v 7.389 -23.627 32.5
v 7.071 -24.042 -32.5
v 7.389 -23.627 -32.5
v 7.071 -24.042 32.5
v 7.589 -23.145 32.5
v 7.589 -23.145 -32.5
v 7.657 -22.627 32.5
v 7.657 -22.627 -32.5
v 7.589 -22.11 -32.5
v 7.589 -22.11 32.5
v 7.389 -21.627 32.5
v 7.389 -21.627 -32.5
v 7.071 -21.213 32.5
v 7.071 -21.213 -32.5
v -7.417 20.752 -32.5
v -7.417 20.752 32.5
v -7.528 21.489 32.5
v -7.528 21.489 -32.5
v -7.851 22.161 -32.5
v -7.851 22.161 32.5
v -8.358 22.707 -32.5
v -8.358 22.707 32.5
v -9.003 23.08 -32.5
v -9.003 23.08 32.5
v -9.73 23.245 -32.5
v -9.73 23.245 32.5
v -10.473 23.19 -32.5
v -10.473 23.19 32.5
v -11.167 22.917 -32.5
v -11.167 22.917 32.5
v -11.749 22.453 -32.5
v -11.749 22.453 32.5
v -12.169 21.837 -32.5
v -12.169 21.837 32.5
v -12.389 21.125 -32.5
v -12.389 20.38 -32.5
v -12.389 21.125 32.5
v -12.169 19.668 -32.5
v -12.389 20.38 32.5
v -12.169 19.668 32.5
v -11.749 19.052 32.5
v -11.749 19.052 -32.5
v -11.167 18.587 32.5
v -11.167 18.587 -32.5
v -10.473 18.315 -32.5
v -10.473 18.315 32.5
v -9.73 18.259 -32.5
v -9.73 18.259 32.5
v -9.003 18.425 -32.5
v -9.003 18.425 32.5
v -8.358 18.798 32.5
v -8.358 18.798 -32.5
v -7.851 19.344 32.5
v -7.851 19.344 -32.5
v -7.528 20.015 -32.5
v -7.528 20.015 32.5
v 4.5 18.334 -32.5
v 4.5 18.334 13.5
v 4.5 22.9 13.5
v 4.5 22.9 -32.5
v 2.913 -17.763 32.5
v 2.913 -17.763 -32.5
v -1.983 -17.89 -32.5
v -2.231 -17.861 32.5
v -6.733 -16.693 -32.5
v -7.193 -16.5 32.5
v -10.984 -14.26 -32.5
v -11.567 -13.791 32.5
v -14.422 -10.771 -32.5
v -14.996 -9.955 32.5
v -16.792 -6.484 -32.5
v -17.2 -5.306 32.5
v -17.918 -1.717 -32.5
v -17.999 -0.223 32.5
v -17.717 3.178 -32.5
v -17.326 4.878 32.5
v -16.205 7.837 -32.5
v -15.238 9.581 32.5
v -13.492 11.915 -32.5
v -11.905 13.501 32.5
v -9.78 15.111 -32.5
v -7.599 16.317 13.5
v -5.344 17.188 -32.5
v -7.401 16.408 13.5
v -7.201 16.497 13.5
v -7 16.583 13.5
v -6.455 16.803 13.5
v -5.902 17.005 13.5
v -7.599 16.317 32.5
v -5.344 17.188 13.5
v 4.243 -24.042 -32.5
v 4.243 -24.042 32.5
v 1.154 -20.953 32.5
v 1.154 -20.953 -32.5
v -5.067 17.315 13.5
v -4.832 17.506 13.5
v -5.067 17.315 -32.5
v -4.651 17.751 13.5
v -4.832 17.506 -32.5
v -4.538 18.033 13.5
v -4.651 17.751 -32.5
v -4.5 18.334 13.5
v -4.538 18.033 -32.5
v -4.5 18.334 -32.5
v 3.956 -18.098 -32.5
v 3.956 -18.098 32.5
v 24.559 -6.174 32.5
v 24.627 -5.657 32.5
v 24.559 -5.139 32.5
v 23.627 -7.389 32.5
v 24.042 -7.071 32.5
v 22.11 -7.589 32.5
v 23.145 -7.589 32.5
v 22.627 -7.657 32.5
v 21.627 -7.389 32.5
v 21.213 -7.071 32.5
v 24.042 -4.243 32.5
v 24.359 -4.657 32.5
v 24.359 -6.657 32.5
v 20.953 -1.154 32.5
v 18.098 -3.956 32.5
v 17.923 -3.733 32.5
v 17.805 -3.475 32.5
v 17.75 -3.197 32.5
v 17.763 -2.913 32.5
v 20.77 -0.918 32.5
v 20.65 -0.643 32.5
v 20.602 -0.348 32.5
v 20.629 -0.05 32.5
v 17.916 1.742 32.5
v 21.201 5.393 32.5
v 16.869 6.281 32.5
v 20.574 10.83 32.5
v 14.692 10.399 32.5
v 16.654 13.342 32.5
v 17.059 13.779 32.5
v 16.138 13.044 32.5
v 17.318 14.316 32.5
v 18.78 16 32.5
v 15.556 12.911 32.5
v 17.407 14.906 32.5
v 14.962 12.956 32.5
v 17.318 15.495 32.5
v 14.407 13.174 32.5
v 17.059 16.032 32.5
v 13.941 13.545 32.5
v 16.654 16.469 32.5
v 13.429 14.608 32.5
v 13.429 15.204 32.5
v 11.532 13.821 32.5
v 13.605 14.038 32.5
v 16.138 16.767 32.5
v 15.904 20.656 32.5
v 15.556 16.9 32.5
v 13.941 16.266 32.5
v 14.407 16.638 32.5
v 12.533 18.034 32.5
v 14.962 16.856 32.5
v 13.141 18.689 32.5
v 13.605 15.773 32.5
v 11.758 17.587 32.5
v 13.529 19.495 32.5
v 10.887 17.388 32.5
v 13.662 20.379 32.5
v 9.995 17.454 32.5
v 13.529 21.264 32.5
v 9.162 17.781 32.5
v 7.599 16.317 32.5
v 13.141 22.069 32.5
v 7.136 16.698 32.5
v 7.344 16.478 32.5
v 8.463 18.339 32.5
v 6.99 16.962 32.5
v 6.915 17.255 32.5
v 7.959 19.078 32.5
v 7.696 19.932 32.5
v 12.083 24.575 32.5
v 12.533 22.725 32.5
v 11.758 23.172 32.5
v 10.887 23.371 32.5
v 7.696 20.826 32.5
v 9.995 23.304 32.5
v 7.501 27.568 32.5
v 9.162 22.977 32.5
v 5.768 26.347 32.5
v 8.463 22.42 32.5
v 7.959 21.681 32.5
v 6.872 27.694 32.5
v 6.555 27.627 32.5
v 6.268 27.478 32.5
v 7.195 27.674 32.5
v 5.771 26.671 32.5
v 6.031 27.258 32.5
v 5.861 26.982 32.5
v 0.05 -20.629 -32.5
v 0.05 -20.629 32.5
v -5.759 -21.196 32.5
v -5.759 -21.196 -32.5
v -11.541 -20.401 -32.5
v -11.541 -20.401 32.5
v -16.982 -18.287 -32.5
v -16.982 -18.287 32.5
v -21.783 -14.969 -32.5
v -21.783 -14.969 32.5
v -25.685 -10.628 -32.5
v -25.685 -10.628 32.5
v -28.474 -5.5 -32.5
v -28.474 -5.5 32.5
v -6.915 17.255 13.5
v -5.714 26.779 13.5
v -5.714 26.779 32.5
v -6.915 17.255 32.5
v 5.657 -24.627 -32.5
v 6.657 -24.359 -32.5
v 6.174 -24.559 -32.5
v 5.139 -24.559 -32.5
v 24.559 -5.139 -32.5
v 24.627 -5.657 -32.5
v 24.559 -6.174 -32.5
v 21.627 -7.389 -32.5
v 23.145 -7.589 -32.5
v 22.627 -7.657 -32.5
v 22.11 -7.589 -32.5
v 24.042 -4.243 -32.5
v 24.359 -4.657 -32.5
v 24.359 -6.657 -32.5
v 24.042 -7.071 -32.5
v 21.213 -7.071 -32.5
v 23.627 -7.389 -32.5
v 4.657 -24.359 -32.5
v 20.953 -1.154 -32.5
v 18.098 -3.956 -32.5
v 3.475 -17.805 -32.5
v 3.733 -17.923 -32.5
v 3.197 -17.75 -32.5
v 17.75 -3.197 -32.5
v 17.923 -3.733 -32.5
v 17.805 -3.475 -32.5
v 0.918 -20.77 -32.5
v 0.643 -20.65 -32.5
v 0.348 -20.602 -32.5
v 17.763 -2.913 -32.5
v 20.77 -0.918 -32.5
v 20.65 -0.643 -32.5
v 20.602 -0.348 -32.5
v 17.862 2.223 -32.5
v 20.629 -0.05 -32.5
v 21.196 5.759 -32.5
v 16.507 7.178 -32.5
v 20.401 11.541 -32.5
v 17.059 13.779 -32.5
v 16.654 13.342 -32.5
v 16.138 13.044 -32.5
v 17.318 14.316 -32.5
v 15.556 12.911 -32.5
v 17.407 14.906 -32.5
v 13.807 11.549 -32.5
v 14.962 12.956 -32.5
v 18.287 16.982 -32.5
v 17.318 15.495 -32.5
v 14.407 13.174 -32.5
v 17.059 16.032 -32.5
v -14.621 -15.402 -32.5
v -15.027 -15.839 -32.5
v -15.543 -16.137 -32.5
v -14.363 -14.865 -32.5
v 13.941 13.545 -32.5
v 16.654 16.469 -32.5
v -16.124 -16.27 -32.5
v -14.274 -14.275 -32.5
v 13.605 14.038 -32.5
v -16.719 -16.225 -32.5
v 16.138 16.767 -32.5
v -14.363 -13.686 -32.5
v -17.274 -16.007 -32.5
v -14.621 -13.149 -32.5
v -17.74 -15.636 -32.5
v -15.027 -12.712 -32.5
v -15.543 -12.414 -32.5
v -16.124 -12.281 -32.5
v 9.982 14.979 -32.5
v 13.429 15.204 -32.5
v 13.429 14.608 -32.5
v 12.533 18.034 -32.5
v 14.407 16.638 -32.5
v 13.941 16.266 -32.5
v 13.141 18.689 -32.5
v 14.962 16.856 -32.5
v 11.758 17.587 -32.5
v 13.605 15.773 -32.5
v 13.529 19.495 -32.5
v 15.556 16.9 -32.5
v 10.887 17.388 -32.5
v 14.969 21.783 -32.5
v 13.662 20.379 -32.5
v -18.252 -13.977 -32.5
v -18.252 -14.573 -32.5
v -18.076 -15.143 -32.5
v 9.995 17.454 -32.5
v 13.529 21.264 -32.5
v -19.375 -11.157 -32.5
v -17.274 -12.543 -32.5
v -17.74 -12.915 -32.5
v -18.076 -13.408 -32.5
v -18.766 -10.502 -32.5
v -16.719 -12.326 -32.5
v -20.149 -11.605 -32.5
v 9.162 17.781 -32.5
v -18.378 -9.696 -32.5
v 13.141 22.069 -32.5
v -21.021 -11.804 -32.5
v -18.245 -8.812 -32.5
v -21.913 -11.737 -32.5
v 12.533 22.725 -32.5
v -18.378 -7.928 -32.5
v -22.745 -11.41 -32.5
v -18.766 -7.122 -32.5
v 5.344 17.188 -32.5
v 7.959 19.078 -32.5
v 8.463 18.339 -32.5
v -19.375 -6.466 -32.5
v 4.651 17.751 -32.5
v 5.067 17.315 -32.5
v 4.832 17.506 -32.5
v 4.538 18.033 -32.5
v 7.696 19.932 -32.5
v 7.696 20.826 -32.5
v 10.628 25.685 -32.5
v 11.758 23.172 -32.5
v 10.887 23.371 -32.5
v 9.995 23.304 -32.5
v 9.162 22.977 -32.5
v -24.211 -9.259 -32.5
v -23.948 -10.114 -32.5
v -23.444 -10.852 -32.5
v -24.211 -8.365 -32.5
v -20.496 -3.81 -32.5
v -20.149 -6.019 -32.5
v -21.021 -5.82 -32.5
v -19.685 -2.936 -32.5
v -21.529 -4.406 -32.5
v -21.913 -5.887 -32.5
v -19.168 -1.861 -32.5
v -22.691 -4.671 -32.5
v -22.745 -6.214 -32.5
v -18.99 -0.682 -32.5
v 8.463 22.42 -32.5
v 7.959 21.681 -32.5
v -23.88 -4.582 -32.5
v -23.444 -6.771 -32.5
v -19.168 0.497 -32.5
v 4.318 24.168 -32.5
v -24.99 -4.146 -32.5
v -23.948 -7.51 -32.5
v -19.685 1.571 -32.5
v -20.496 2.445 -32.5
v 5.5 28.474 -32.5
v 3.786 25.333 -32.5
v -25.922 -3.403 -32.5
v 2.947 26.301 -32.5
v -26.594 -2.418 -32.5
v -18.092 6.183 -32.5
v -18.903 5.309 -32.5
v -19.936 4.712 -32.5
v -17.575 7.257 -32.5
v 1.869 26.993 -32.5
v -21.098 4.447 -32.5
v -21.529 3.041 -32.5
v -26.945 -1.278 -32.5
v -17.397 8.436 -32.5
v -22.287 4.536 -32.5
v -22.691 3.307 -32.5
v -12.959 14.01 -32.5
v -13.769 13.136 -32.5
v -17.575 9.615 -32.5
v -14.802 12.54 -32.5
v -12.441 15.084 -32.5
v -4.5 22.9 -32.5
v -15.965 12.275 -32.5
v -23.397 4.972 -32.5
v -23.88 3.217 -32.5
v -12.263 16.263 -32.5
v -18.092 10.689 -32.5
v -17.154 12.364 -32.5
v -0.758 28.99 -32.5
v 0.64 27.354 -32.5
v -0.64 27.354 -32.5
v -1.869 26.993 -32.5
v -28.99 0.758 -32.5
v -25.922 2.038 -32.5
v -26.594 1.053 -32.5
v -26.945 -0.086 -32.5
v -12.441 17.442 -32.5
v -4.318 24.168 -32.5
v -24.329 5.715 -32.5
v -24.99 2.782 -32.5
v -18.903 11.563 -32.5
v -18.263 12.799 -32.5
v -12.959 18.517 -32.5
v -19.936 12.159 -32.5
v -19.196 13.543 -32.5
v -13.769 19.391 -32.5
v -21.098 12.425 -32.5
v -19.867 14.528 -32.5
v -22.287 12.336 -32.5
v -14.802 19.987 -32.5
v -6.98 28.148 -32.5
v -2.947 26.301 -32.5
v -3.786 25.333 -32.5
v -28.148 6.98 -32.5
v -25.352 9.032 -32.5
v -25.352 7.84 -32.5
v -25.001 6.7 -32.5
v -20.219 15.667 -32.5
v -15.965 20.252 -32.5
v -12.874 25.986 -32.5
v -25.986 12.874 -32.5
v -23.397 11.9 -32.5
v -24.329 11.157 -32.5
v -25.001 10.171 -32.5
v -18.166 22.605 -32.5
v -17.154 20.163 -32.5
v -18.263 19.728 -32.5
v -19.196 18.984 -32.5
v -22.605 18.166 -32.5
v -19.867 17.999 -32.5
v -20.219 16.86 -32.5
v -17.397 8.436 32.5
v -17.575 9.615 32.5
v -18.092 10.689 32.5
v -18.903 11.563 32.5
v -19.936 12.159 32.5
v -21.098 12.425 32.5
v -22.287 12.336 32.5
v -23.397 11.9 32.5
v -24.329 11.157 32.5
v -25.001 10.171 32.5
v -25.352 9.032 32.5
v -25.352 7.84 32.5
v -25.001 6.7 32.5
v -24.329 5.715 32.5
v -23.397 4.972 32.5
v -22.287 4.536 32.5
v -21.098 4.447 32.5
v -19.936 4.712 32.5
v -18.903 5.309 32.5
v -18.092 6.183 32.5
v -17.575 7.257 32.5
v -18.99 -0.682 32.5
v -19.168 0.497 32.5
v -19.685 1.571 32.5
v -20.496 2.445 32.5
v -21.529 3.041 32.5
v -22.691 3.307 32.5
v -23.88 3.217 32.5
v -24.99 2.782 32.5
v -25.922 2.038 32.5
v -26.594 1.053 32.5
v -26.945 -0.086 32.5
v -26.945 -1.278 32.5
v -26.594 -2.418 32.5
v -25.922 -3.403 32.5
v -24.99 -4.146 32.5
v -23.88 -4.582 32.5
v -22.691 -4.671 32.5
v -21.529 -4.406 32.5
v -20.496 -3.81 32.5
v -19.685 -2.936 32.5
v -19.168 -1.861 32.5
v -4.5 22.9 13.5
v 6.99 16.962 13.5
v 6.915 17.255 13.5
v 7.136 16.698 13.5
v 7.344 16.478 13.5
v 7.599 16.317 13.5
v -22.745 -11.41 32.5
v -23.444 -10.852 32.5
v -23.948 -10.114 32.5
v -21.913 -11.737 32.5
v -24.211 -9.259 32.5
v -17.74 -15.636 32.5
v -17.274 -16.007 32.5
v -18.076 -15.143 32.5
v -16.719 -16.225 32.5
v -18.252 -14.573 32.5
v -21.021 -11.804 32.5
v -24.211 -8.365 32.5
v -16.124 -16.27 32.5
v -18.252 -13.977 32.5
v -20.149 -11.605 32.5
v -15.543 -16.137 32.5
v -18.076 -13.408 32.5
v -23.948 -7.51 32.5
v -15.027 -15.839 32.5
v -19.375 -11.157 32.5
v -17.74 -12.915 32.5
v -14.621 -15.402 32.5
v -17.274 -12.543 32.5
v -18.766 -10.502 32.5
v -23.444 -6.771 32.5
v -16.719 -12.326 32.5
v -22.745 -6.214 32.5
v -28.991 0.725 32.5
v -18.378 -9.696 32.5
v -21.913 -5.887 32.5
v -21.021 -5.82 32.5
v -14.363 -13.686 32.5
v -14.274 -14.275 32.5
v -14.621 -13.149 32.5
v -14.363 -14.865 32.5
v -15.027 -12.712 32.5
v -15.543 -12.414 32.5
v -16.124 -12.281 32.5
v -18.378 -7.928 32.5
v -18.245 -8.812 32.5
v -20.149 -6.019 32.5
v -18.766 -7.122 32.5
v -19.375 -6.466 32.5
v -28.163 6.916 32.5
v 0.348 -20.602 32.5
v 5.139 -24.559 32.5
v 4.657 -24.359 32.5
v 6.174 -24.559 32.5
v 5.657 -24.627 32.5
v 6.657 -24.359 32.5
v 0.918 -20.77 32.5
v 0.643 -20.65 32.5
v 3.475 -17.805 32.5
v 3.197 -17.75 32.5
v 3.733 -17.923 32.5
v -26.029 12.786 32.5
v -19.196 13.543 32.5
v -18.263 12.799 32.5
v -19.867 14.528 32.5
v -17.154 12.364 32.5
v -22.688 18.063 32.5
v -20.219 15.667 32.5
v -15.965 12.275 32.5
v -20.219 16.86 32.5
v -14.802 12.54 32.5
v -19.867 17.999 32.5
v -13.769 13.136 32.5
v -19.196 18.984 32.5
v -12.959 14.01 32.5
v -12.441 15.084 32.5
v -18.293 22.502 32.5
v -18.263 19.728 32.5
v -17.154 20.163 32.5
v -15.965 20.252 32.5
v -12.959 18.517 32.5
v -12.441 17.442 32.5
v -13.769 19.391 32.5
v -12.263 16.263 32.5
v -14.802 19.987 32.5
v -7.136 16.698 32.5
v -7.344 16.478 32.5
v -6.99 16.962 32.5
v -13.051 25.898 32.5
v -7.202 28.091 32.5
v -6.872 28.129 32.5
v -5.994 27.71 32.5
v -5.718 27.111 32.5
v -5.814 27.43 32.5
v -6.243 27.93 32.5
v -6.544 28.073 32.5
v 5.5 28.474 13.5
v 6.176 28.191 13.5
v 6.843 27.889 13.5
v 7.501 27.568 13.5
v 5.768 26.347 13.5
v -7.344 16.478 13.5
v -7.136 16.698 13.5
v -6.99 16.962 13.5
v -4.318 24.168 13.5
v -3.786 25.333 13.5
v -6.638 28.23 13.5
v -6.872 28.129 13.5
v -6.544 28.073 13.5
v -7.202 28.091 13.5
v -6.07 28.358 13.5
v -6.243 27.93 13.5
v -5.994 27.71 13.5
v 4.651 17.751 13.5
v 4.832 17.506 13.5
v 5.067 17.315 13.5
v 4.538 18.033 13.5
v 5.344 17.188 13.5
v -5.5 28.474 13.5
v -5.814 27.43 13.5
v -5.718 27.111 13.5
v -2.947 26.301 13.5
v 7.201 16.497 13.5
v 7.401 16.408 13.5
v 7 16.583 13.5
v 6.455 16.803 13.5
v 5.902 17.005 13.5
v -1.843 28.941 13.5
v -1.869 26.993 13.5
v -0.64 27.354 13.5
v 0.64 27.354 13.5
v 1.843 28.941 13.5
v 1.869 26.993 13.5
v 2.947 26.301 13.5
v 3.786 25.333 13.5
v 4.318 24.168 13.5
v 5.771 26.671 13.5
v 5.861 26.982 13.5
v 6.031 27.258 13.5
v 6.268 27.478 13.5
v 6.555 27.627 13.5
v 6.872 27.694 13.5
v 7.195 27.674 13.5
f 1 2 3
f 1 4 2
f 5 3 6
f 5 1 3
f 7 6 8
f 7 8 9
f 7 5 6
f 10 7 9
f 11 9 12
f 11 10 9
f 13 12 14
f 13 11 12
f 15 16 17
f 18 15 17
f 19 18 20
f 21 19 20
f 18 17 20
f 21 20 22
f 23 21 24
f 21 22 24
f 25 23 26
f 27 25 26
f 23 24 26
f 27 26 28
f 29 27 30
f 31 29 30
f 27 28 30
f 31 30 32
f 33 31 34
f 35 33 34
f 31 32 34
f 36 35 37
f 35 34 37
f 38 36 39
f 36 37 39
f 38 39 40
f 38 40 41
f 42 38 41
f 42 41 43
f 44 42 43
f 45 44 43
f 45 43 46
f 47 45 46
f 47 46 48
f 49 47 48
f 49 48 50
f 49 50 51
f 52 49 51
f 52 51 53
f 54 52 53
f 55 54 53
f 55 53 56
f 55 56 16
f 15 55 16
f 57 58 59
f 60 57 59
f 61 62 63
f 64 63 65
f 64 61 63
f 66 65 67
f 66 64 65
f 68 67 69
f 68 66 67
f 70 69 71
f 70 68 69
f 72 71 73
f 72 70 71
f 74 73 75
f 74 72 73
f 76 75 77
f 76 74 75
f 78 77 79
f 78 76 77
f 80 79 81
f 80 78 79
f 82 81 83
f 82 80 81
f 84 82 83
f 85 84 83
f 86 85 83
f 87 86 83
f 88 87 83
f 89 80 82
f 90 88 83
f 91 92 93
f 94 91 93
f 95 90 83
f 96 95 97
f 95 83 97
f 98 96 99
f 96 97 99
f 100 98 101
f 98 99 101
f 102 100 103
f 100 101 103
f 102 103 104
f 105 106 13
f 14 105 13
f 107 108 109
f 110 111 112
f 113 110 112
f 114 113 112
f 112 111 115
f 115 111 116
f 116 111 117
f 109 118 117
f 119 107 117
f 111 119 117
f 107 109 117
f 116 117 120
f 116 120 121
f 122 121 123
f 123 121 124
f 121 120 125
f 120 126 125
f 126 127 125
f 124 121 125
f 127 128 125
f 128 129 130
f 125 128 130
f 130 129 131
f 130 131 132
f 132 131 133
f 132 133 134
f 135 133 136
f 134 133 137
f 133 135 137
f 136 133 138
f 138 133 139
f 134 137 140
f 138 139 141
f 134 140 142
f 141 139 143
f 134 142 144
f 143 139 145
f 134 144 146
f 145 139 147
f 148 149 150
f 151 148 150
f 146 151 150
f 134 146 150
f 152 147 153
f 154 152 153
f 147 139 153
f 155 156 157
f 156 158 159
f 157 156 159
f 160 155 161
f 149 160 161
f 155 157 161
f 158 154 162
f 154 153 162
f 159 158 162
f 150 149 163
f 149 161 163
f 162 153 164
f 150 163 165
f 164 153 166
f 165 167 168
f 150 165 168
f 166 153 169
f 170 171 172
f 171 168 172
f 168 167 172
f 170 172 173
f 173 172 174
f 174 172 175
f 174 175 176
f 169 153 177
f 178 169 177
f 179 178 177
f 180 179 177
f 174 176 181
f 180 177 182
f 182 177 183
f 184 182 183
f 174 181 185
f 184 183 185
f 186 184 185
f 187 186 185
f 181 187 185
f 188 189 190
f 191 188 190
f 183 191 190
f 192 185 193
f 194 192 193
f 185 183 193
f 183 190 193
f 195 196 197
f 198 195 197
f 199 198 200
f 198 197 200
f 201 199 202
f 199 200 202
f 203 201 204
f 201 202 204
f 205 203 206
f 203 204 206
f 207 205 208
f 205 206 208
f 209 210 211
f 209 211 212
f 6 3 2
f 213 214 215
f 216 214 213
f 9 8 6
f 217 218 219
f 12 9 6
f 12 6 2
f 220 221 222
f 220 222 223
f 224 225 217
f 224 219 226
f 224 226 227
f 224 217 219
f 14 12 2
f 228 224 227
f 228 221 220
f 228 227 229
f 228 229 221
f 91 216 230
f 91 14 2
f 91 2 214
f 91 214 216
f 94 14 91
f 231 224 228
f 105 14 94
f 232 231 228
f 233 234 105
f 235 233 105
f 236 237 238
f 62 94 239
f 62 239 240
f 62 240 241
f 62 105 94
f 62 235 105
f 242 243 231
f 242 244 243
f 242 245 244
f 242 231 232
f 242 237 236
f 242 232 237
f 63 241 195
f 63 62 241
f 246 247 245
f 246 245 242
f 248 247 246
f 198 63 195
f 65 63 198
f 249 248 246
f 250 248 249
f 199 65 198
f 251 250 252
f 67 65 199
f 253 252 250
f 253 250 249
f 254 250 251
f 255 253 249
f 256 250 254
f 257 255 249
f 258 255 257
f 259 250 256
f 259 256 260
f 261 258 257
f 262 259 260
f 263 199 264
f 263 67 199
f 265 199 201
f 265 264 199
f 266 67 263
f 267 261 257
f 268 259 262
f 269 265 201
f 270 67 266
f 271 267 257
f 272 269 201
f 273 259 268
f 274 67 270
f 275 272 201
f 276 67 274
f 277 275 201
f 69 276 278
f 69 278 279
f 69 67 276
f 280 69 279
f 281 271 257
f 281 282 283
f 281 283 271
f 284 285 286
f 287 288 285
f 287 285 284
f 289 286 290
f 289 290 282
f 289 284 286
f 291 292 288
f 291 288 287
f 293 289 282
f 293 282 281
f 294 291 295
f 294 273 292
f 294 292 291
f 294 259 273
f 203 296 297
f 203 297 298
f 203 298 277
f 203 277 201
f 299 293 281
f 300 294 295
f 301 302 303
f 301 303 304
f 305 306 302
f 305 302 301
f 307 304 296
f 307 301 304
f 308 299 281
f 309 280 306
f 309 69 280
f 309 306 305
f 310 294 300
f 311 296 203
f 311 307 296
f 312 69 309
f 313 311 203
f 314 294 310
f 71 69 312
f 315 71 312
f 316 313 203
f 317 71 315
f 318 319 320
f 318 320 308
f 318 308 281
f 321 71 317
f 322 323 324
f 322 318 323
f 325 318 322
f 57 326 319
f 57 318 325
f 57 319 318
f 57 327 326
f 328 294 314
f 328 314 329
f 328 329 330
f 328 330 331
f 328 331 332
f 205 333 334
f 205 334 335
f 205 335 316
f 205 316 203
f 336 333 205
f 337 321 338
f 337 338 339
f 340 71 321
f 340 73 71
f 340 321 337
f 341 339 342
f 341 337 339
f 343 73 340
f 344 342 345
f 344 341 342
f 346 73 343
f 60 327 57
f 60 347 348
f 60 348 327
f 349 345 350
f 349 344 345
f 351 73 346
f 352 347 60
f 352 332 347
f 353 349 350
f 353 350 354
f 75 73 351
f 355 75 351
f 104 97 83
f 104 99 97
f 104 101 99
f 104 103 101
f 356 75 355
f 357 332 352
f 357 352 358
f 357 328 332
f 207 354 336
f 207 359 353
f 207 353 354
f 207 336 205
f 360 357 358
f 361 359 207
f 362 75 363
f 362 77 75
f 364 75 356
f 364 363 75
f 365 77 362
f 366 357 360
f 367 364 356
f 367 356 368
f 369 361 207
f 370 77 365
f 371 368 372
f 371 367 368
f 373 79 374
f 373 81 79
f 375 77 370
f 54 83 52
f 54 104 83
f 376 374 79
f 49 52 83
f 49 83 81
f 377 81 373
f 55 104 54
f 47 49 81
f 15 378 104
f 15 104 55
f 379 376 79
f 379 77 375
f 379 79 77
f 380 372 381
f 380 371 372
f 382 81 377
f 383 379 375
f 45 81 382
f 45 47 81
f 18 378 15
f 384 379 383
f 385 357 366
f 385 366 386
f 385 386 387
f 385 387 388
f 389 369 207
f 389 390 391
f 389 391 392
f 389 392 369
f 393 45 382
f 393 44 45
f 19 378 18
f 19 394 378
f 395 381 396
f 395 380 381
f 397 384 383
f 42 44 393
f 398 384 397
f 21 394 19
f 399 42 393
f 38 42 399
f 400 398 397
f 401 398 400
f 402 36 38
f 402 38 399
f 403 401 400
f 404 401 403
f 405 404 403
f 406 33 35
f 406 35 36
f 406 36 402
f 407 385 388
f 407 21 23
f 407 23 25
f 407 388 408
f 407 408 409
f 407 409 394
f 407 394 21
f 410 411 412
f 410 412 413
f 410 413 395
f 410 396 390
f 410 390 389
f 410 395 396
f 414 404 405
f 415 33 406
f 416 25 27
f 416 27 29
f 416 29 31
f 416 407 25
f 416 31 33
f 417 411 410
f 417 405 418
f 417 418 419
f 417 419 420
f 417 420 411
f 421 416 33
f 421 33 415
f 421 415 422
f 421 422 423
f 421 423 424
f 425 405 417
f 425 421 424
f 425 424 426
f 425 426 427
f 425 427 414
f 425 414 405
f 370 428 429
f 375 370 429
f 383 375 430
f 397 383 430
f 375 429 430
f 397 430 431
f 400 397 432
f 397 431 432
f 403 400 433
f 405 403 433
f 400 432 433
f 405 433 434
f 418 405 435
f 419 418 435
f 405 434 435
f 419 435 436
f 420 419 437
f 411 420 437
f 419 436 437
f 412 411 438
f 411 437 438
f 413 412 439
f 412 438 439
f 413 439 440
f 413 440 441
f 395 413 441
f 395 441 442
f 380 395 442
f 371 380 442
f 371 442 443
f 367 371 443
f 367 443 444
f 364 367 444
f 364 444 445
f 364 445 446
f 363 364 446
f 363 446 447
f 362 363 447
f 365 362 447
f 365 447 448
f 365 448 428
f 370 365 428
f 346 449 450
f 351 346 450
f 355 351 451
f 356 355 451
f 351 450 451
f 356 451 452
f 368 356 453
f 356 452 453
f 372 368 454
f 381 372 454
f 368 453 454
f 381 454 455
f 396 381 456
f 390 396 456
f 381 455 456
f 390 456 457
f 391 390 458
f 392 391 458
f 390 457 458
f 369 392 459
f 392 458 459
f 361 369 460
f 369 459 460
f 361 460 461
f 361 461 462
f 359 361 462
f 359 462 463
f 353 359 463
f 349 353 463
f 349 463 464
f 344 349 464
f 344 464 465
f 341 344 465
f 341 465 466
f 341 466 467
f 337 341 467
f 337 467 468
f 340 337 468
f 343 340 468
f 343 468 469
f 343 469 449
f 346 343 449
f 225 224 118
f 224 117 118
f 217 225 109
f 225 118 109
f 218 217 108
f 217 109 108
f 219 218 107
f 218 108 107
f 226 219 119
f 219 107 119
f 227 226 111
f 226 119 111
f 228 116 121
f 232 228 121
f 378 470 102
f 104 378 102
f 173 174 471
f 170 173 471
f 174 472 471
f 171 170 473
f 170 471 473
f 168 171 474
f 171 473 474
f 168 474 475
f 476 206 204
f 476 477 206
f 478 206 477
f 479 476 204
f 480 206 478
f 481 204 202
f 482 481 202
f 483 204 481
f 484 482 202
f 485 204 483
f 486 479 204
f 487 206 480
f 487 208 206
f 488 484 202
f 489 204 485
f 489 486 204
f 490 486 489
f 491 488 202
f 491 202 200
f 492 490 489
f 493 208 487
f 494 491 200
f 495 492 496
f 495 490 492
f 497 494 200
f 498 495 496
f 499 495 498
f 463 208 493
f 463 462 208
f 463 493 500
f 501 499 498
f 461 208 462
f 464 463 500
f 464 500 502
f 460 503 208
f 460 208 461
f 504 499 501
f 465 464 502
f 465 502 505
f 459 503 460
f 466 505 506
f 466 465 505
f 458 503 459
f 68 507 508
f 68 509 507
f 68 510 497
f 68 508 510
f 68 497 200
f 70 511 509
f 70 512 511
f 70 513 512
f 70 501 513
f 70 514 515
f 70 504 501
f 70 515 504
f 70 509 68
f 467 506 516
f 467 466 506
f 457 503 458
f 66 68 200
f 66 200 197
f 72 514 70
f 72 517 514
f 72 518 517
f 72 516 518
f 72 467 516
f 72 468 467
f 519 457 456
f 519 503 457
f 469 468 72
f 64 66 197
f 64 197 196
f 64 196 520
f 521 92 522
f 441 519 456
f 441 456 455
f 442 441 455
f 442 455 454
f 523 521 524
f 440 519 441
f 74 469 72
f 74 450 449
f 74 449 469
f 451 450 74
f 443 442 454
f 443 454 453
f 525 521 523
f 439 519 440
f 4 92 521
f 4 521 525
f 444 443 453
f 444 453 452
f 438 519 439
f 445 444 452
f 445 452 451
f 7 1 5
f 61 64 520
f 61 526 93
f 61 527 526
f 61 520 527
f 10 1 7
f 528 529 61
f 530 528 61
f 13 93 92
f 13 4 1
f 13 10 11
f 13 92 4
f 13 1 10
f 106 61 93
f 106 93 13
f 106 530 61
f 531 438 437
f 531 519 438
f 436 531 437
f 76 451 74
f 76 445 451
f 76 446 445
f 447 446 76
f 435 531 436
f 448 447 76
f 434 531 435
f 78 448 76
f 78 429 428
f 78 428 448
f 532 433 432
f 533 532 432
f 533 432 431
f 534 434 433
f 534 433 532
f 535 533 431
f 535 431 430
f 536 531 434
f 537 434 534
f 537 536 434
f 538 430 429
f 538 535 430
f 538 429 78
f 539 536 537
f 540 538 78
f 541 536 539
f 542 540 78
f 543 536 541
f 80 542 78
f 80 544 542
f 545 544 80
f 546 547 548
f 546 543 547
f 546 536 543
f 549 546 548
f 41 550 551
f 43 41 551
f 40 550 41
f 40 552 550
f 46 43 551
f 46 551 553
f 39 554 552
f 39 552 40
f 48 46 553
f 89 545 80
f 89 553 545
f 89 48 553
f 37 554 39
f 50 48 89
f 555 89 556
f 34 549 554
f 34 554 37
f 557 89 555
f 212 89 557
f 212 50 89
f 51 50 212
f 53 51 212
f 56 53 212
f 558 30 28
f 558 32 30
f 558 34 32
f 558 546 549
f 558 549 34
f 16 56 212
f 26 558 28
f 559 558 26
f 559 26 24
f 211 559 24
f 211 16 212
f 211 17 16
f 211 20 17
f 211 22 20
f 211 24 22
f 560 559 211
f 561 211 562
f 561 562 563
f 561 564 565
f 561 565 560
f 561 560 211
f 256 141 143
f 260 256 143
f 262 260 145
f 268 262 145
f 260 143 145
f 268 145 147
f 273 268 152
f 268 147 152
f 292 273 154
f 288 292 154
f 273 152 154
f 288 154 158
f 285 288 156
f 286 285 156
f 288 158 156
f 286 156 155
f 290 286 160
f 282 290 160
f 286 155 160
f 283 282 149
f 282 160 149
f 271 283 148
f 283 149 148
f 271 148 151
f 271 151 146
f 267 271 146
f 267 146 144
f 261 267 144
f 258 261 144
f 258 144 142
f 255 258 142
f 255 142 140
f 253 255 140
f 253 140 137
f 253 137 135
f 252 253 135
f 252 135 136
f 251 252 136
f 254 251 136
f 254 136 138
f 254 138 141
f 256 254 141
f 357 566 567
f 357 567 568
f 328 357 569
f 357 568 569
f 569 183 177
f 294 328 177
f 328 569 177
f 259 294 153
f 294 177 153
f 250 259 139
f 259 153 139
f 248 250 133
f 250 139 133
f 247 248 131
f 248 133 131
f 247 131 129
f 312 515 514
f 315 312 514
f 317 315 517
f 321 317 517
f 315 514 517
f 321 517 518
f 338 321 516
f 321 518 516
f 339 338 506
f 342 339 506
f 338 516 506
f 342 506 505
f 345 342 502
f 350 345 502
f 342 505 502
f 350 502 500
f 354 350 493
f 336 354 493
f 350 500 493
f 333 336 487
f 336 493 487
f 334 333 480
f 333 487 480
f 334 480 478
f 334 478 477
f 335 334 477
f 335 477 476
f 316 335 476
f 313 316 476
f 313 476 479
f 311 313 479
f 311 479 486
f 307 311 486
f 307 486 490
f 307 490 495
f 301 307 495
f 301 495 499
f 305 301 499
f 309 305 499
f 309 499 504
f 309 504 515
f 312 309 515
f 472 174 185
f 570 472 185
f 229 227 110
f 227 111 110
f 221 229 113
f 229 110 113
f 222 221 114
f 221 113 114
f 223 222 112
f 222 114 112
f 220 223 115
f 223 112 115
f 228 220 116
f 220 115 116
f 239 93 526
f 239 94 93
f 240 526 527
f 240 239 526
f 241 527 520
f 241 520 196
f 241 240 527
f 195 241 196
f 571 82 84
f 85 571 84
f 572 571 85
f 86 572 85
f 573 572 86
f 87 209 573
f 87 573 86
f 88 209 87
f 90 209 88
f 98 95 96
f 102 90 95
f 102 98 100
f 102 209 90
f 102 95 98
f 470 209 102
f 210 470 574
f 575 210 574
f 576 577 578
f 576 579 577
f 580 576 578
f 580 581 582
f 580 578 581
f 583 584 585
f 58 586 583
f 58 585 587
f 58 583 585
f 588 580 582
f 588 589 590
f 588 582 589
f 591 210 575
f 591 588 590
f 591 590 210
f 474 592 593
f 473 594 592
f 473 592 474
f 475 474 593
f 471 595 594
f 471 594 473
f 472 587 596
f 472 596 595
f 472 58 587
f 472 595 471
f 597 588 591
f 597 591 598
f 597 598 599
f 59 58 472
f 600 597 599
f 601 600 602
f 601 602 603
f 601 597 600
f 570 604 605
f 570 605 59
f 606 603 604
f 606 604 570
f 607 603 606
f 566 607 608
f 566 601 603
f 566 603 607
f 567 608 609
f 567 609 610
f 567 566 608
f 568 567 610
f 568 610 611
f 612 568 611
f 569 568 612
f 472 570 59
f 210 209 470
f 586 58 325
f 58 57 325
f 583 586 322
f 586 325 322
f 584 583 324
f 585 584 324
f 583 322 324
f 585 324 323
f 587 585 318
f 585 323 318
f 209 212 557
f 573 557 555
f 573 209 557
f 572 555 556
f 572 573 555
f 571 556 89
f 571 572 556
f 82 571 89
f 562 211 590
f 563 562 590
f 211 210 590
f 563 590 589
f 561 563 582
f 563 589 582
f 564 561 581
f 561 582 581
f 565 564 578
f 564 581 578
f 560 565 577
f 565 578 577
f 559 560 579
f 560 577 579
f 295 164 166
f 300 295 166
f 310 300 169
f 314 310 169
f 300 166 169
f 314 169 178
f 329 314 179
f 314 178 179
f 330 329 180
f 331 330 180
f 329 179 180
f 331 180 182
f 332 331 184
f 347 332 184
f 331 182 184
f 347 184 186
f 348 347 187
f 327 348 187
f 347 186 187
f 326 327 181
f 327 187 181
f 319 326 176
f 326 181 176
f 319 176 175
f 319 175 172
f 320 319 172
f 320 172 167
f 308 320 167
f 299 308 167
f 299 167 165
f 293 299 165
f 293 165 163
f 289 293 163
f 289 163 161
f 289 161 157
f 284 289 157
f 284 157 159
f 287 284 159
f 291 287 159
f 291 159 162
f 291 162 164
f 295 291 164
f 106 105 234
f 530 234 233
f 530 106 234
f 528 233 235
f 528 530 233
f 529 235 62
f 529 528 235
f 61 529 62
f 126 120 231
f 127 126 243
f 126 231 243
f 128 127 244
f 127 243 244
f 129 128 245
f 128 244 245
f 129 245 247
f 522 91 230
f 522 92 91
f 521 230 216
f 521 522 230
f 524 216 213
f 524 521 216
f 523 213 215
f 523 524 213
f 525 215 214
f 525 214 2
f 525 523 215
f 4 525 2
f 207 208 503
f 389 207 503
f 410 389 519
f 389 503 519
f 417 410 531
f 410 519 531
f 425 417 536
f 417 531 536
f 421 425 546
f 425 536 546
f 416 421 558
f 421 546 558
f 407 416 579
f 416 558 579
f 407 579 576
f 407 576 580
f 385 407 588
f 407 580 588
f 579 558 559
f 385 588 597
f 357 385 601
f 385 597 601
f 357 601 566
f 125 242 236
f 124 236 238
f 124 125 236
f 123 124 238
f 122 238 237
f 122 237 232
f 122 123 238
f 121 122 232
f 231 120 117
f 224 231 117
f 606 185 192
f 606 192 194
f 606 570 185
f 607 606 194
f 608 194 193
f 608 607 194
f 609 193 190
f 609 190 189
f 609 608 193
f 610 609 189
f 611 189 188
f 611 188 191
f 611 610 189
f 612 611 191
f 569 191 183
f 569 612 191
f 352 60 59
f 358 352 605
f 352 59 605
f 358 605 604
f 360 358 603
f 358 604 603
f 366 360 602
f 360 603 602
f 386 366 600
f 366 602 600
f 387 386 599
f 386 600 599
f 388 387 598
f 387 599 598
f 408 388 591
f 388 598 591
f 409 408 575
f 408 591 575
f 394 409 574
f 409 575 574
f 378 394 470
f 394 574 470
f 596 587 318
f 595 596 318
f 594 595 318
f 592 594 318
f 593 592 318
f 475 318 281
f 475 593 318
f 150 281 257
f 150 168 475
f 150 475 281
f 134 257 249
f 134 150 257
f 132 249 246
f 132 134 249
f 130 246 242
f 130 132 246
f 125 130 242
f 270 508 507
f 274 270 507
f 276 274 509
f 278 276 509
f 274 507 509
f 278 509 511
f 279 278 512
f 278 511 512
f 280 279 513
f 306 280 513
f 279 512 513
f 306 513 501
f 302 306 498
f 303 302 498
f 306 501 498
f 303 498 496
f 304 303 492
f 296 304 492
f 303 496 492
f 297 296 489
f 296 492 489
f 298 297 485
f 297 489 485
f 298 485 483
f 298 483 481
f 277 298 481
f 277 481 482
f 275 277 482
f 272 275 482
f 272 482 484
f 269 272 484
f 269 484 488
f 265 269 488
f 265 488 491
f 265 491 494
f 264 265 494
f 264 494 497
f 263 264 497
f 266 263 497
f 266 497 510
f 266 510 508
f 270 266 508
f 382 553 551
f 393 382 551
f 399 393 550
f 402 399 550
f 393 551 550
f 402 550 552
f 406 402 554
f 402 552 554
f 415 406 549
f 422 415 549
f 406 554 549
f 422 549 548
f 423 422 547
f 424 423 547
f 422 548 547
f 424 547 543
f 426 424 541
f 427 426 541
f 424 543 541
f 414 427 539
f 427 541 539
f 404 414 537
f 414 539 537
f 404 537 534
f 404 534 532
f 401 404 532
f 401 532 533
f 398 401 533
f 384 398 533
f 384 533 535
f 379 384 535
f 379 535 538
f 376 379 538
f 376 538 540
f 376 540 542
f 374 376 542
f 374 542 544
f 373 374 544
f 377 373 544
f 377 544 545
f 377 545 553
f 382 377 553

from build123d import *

# Parameters (mm, degrees)
F0_W     = 11
F0_H     = 65
F3_DEPTH = 19
F4_DEPTH = 65
F5_DEPTH = 65.001
F6_R     = 1.2
F7_R     = 1.99999
F2_R     = 2.5
F2_R_2   = 4
F2_R_3   = 3
F2_R_4   = 2
F8_DEPTH = 65.001


# Not quite as in the source:
# - a fillet or chamfer is up to 0.001 mm smaller than in the source, because OpenCascade refuses the exact size
# - a feature names something its author has since deleted; it is built from what else it names


with BuildPart() as f1:
    # F0 (on Front) → F1 (revolve)
    with BuildSketch(Plane.XZ):
        with Locations((-23.5, 0)):
            Rectangle(F0_W, F0_H)
    revolve(axis=Axis((0, 0, 0.8657751605), (0, 0, -1)))

    # F2 (on face) → F3 (cut)
    with BuildSketch(Plane.XY.offset(32.5)):
        with BuildLine():
            ThreePointArc((-4.5, 22.9), (0, 27.4), (4.5, 22.9))
            Line((4.5, 22.9), (4.5, 17.4284250579))
            ThreePointArc((4.5, 17.4284250579), (5.7655124222, 17.0516528967), (7, 16.5831239518))
            Line((7, 16.5831239518), (5.5, 28.4736720498))
            Line((5.5, 28.4736720498), (-5.5, 28.4736720498))
            Line((-5.5, 28.4736720498), (-7, 16.5831239518))
            ThreePointArc((-7, 16.5831239518), (-5.7655124222, 17.0516528967), (-4.5, 17.4284250579))
            Line((-4.5, 17.4284250579), (-4.5, 22.9))
        make_face()
        with BuildLine():
            Line((-5.5, 28.4736720498), (5.5, 28.4736720498))
            ThreePointArc((5.5, 28.4736720498), (0, 29), (-5.5, 28.4736720498))
        make_face()
        with BuildLine():
            ThreePointArc((17.6540730561, -3.5119374324), (12.7279220614, -12.7279220614), (3.5119374324, -17.6540730561))
            Line((3.5119374324, -17.6540730561), (8.4852813742, -22.627416998))
            Line((8.4852813742, -22.627416998), (5.6568542495, -25.4558441227))
            Line((5.6568542495, -25.4558441227), (2.1959599702, -28.916738402))
            ThreePointArc((2.1959599702, -28.916738402), (20.5060966544, -20.5060966544), (28.916738402, -2.1959599702))
            Line((28.916738402, -2.1959599702), (25.4558441227, -5.6568542495))
            Line((25.4558441227, -5.6568542495), (22.627416998, -8.4852813742))
            Line((22.627416998, -8.4852813742), (17.6540730561, -3.5119374324))
        make_face()
    extrude(amount=-F3_DEPTH, mode=Mode.SUBTRACT)

    # F2 (on face) → F4 (join, through all)
    with BuildSketch(Plane.XY.offset(32.5)):
        Polygon((8.4852813742, -22.627416998), (3.5119374324, -17.6540730561), (0.6835103076, -20.4825001809), (5.6568542495, -25.4558441227), align=None)
        with BuildLine():
            Line((5.6568542495, -25.4558441227), (0.6835103076, -20.4825001809))
            Line((0.6835103076, -20.4825001809), (-6.981162826, -28.1471733145))
            ThreePointArc((-6.981162826, -28.1471733145), (-2.4233446306, -28.8985709128), (2.1959599702, -28.916738402))
            Line((2.1959599702, -28.916738402), (5.6568542495, -25.4558441227))
        make_face()
        with BuildLine():
            ThreePointArc((2.1959599702, -28.916738402), (-2.4233446306, -28.8985709128), (-6.981162826, -28.1471733145))
            Line((-6.981162826, -28.1471733145), (-2.0078188841, -33.1205172564))
            Line((-2.0078188841, -33.1205172564), (2.1959599702, -28.916738402))
        make_face()
        Polygon((25.4558441227, -5.6568542495), (20.4825001809, -0.6835103076), (17.6540730561, -3.5119374324), (22.627416998, -8.4852813742), align=None)
        with BuildLine():
            Line((28.1471733145, 6.981162826), (20.4825001809, -0.6835103076))
            Line((20.4825001809, -0.6835103076), (25.4558441227, -5.6568542495))
            Line((25.4558441227, -5.6568542495), (28.916738402, -2.1959599702))
            ThreePointArc((28.916738402, -2.1959599702), (28.9791771248, -1.0987689344), (29, 0))
            ThreePointArc((29, 0), (28.7860037702, 3.5165305259), (28.1471733145, 6.981162826))
        make_face()
        with BuildLine():
            Line((33.1205172564, 2.0078188841), (28.1471733145, 6.981162826))
            ThreePointArc((28.1471733145, 6.981162826), (28.7860037702, 3.5165305259), (29, 0))
            ThreePointArc((29, 0), (28.9791771248, -1.0987689344), (28.916738402, -2.1959599702))
            Line((28.916738402, -2.1959599702), (33.1205172564, 2.0078188841))
        make_face()
    extrude(amount=-F4_DEPTH)

    # F2 (on face) → F5 (cut, through all)
    with BuildSketch(Plane.XY.offset(32.5)):
        with BuildLine():
            ThreePointArc((-4.5, 22.9), (0, 18.4), (4.5, 22.9))
            ThreePointArc((4.5, 22.9), (0, 27.4), (-4.5, 22.9))
        make_face()
        with BuildLine():
            Line((4.5, 17.4284250579), (4.5, 22.9))
            ThreePointArc((4.5, 22.9), (0, 18.4), (-4.5, 22.9))
            Line((-4.5, 22.9), (-4.5, 17.4284250579))
            ThreePointArc((-4.5, 17.4284250579), (0, 18), (4.5, 17.4284250579))
        make_face()
        with BuildLine():
            ThreePointArc((7, 16.5831239518), (5.7655124222, 17.0516528967), (4.5, 17.4284250579))
            ThreePointArc((4.5, 17.4284250579), (0, 18), (-4.5, 17.4284250579))
            ThreePointArc((-4.5, 17.4284250579), (-5.7655124222, 17.0516528967), (-7, 16.5831239518))
            Line((-7, 16.5831239518), (7, 16.5831239518))
        make_face()
        with BuildLine():
            ThreePointArc((28.1471733145, 6.981162826), (19.9628418868, 21.0353260921), (5.5, 28.4736720498))
            ThreePointArc((5.5, 28.4736720498), (18.4372066045, 16.6935009467), (20.4825001809, -0.6835103076))
            Line((20.4825001809, -0.6835103076), (28.1471733145, 6.981162826))
        make_face()
        with BuildLine():
            ThreePointArc((17.6540730561, -3.5119374324), (12.7279220614, -12.7279220614), (3.5119374324, -17.6540730561))
            Line((3.5119374324, -17.6540730561), (8.4852813742, -22.627416998))
            Line((8.4852813742, -22.627416998), (5.6568542495, -25.4558441227))
            Line((5.6568542495, -25.4558441227), (2.1959599702, -28.916738402))
            ThreePointArc((2.1959599702, -28.916738402), (20.5060966544, -20.5060966544), (28.916738402, -2.1959599702))
            Line((28.916738402, -2.1959599702), (25.4558441227, -5.6568542495))
            Line((25.4558441227, -5.6568542495), (22.627416998, -8.4852813742))
            Line((22.627416998, -8.4852813742), (17.6540730561, -3.5119374324))
        make_face()
        with BuildLine():
            Line((28.1471733145, 6.981162826), (20.4825001809, -0.6835103076))
            Line((20.4825001809, -0.6835103076), (25.4558441227, -5.6568542495))
            Line((25.4558441227, -5.6568542495), (28.916738402, -2.1959599702))
            ThreePointArc((28.916738402, -2.1959599702), (28.9791771248, -1.0987689344), (29, 0))
            ThreePointArc((29, 0), (28.7860037702, 3.5165305259), (28.1471733145, 6.981162826))
        make_face()
        with BuildLine():
            Line((33.1205172564, 2.0078188841), (28.1471733145, 6.981162826))
            ThreePointArc((28.1471733145, 6.981162826), (28.7860037702, 3.5165305259), (29, 0))
            ThreePointArc((29, 0), (28.9791771248, -1.0987689344), (28.916738402, -2.1959599702))
            Line((28.916738402, -2.1959599702), (33.1205172564, 2.0078188841))
        make_face()
        with BuildLine():
            Line((5.6568542495, -25.4558441227), (0.6835103076, -20.4825001809))
            Line((0.6835103076, -20.4825001809), (-6.981162826, -28.1471733145))
            ThreePointArc((-6.981162826, -28.1471733145), (-2.4233446306, -28.8985709128), (2.1959599702, -28.916738402))
            Line((2.1959599702, -28.916738402), (5.6568542495, -25.4558441227))
        make_face()
        with BuildLine():
            Line((-6.981162826, -28.1471733145), (0.6835103076, -20.4825001809))
            ThreePointArc((0.6835103076, -20.4825001809), (-16.6935009467, -18.4372066045), (-28.4736720498, -5.5))
            ThreePointArc((-28.4736720498, -5.5), (-21.0353260921, -19.9628418868), (-6.981162826, -28.1471733145))
        make_face()
        with BuildLine():
            ThreePointArc((2.1959599702, -28.916738402), (-2.4233446306, -28.8985709128), (-6.981162826, -28.1471733145))
            Line((-6.981162826, -28.1471733145), (-2.0078188841, -33.1205172564))
            Line((-2.0078188841, -33.1205172564), (2.1959599702, -28.916738402))
        make_face()
    extrude(amount=-F5_DEPTH, mode=Mode.SUBTRACT)

    # F6
    f6_edges = [f1.edges().sort_by_distance(p)[0] for p in [
        (3.511937, -17.654073, 0),
        (4.5, 17.428425, -9.5),
        (7, 16.583124, 23),
        (-7, 16.583124, 23),
        (-4.5, 17.428425, -9.5),
        (5.5, 28.473672, 23),
        (-5.5, 28.473672, 23),
        (0.68351, -20.4825, 0),
        (20.4825, -0.68351, 0),
        (17.654073, -3.511937, 0),
    ]]
    fillet(f6_edges, radius=F6_R)

    # F7 (radius 2 in the source; OpenCascade refuses exactly that, so slightly less here)
    f7_edges = [f1.edges().sort_by_distance(p)[0] for p in [
        (5.656854, -25.455844, 0),
        (8.485281, -22.627417, 0),
        (22.627417, -8.485281, 0),
        (25.455844, -5.656854, 0),
    ]]
    fillet(f7_edges, radius=F7_R)

    # F2 (on face) → F8 (cut, through all)
    with BuildSketch(Plane.XY.offset(32.5)):
        with Locations((-9.916601295, 20.7523738102)):
            Circle(F2_R)
        with Locations((-16.2634559673, 16.2634559673)):
            Circle(F2_R_2)
        with Locations((-21.397117557, 8.4358378511)):
            Circle(F2_R_2)
        with Locations((10.6623319362, 20.3792707839)):
            Circle(F2_R_3)
        with Locations((-22.9898786685, -0.6822600723)):
            Circle(F2_R_2)
        with Locations((-21.2449889591, -8.8119489404)):
            Circle(F2_R_3)
        with Locations((-16.2738828113, -14.2753784675)):
            Circle(F2_R_4)
        with Locations((15.4069372375, 14.9056833158)):
            Circle(F2_R_4)
    extrude(amount=-F8_DEPTH, mode=Mode.SUBTRACT)


solid = f1.part
